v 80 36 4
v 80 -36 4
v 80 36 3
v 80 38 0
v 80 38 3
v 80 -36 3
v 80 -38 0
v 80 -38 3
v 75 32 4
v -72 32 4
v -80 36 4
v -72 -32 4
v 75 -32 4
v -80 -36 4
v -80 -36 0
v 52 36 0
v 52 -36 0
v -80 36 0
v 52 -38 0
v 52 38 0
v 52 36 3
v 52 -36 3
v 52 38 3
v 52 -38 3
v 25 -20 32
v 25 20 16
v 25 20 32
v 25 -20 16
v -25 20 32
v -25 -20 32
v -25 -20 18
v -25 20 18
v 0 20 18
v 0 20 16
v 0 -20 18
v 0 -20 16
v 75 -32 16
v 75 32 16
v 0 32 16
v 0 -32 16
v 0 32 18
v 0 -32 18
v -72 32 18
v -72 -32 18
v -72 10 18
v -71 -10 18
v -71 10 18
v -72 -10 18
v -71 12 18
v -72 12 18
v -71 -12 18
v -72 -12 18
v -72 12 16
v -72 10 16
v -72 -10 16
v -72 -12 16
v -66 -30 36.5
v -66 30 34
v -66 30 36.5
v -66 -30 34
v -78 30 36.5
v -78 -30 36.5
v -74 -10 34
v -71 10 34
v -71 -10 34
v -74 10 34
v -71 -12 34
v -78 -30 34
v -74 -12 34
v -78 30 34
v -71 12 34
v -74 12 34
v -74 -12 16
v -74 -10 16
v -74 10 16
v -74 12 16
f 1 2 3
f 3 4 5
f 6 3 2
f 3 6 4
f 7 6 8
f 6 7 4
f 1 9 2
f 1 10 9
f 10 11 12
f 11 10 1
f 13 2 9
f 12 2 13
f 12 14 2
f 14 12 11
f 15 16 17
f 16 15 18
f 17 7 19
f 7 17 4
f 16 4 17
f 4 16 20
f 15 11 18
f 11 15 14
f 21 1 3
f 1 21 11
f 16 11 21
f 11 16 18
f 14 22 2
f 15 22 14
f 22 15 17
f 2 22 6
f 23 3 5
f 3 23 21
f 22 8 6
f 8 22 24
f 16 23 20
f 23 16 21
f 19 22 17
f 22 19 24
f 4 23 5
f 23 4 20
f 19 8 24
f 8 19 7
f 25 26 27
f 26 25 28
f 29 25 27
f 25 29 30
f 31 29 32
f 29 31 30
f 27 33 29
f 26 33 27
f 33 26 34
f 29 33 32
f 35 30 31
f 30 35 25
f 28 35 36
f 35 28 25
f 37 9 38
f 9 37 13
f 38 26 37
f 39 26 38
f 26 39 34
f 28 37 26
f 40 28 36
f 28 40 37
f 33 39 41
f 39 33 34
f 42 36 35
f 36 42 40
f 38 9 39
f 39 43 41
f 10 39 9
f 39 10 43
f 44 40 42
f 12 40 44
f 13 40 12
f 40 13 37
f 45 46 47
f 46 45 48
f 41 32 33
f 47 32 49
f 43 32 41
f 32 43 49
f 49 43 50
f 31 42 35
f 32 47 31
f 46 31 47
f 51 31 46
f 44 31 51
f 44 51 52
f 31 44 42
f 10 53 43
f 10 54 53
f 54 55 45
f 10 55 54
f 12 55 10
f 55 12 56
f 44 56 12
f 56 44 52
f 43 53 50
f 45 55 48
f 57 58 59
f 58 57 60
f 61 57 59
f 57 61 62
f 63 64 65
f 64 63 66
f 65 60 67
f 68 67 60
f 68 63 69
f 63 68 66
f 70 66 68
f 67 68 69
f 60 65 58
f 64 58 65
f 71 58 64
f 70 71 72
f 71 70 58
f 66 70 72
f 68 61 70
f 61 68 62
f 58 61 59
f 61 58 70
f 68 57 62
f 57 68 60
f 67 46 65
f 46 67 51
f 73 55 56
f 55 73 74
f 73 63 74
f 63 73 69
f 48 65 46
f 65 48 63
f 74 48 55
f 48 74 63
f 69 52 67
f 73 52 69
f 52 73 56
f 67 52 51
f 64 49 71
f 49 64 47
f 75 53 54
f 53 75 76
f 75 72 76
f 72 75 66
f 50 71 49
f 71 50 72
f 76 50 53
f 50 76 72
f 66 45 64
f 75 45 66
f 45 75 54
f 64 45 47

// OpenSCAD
// Aerodynamic Sports Car Chassis & Aero Domain
// Parametric OpenSCAD Model - RUN01 CAD Studio
length = 160;
width = 72;
wheelbase = 105;

module chassis_platform() {
  // Undertray
  translate([-length/2, -width/2, 0])
    cube([length, width, 4]);

  // Front Splitter
  translate([length/2 - 28, -width/2 - 2, 0])
    cube([28, width + 4, 3]);

  // Cockpit Greenhouse
  translate([-25, -20, 12])
    cube([50, 40, 20]);

  // Nose Hood
  translate([0, -width/2 + 4, 4])
    cube([length/2 - 5, width - 8, 12]);

  // Rear Engine Deck
  translate([-length/2 + 8, -width/2 + 4, 4])
    cube([length/2 - 8, width - 8, 14]);

  // Rear Wing
  translate([-length/2 + 2, -width/2 + 6, 34])
    cube([12, width - 12, 2.5]);
  // Wing Struts
  translate([-length/2 + 6, -12, 16]) cube([3, 2, 18]);
  translate([-length/2 + 6, 10, 16])  cube([3, 2, 18]);
}

chassis_platform();
